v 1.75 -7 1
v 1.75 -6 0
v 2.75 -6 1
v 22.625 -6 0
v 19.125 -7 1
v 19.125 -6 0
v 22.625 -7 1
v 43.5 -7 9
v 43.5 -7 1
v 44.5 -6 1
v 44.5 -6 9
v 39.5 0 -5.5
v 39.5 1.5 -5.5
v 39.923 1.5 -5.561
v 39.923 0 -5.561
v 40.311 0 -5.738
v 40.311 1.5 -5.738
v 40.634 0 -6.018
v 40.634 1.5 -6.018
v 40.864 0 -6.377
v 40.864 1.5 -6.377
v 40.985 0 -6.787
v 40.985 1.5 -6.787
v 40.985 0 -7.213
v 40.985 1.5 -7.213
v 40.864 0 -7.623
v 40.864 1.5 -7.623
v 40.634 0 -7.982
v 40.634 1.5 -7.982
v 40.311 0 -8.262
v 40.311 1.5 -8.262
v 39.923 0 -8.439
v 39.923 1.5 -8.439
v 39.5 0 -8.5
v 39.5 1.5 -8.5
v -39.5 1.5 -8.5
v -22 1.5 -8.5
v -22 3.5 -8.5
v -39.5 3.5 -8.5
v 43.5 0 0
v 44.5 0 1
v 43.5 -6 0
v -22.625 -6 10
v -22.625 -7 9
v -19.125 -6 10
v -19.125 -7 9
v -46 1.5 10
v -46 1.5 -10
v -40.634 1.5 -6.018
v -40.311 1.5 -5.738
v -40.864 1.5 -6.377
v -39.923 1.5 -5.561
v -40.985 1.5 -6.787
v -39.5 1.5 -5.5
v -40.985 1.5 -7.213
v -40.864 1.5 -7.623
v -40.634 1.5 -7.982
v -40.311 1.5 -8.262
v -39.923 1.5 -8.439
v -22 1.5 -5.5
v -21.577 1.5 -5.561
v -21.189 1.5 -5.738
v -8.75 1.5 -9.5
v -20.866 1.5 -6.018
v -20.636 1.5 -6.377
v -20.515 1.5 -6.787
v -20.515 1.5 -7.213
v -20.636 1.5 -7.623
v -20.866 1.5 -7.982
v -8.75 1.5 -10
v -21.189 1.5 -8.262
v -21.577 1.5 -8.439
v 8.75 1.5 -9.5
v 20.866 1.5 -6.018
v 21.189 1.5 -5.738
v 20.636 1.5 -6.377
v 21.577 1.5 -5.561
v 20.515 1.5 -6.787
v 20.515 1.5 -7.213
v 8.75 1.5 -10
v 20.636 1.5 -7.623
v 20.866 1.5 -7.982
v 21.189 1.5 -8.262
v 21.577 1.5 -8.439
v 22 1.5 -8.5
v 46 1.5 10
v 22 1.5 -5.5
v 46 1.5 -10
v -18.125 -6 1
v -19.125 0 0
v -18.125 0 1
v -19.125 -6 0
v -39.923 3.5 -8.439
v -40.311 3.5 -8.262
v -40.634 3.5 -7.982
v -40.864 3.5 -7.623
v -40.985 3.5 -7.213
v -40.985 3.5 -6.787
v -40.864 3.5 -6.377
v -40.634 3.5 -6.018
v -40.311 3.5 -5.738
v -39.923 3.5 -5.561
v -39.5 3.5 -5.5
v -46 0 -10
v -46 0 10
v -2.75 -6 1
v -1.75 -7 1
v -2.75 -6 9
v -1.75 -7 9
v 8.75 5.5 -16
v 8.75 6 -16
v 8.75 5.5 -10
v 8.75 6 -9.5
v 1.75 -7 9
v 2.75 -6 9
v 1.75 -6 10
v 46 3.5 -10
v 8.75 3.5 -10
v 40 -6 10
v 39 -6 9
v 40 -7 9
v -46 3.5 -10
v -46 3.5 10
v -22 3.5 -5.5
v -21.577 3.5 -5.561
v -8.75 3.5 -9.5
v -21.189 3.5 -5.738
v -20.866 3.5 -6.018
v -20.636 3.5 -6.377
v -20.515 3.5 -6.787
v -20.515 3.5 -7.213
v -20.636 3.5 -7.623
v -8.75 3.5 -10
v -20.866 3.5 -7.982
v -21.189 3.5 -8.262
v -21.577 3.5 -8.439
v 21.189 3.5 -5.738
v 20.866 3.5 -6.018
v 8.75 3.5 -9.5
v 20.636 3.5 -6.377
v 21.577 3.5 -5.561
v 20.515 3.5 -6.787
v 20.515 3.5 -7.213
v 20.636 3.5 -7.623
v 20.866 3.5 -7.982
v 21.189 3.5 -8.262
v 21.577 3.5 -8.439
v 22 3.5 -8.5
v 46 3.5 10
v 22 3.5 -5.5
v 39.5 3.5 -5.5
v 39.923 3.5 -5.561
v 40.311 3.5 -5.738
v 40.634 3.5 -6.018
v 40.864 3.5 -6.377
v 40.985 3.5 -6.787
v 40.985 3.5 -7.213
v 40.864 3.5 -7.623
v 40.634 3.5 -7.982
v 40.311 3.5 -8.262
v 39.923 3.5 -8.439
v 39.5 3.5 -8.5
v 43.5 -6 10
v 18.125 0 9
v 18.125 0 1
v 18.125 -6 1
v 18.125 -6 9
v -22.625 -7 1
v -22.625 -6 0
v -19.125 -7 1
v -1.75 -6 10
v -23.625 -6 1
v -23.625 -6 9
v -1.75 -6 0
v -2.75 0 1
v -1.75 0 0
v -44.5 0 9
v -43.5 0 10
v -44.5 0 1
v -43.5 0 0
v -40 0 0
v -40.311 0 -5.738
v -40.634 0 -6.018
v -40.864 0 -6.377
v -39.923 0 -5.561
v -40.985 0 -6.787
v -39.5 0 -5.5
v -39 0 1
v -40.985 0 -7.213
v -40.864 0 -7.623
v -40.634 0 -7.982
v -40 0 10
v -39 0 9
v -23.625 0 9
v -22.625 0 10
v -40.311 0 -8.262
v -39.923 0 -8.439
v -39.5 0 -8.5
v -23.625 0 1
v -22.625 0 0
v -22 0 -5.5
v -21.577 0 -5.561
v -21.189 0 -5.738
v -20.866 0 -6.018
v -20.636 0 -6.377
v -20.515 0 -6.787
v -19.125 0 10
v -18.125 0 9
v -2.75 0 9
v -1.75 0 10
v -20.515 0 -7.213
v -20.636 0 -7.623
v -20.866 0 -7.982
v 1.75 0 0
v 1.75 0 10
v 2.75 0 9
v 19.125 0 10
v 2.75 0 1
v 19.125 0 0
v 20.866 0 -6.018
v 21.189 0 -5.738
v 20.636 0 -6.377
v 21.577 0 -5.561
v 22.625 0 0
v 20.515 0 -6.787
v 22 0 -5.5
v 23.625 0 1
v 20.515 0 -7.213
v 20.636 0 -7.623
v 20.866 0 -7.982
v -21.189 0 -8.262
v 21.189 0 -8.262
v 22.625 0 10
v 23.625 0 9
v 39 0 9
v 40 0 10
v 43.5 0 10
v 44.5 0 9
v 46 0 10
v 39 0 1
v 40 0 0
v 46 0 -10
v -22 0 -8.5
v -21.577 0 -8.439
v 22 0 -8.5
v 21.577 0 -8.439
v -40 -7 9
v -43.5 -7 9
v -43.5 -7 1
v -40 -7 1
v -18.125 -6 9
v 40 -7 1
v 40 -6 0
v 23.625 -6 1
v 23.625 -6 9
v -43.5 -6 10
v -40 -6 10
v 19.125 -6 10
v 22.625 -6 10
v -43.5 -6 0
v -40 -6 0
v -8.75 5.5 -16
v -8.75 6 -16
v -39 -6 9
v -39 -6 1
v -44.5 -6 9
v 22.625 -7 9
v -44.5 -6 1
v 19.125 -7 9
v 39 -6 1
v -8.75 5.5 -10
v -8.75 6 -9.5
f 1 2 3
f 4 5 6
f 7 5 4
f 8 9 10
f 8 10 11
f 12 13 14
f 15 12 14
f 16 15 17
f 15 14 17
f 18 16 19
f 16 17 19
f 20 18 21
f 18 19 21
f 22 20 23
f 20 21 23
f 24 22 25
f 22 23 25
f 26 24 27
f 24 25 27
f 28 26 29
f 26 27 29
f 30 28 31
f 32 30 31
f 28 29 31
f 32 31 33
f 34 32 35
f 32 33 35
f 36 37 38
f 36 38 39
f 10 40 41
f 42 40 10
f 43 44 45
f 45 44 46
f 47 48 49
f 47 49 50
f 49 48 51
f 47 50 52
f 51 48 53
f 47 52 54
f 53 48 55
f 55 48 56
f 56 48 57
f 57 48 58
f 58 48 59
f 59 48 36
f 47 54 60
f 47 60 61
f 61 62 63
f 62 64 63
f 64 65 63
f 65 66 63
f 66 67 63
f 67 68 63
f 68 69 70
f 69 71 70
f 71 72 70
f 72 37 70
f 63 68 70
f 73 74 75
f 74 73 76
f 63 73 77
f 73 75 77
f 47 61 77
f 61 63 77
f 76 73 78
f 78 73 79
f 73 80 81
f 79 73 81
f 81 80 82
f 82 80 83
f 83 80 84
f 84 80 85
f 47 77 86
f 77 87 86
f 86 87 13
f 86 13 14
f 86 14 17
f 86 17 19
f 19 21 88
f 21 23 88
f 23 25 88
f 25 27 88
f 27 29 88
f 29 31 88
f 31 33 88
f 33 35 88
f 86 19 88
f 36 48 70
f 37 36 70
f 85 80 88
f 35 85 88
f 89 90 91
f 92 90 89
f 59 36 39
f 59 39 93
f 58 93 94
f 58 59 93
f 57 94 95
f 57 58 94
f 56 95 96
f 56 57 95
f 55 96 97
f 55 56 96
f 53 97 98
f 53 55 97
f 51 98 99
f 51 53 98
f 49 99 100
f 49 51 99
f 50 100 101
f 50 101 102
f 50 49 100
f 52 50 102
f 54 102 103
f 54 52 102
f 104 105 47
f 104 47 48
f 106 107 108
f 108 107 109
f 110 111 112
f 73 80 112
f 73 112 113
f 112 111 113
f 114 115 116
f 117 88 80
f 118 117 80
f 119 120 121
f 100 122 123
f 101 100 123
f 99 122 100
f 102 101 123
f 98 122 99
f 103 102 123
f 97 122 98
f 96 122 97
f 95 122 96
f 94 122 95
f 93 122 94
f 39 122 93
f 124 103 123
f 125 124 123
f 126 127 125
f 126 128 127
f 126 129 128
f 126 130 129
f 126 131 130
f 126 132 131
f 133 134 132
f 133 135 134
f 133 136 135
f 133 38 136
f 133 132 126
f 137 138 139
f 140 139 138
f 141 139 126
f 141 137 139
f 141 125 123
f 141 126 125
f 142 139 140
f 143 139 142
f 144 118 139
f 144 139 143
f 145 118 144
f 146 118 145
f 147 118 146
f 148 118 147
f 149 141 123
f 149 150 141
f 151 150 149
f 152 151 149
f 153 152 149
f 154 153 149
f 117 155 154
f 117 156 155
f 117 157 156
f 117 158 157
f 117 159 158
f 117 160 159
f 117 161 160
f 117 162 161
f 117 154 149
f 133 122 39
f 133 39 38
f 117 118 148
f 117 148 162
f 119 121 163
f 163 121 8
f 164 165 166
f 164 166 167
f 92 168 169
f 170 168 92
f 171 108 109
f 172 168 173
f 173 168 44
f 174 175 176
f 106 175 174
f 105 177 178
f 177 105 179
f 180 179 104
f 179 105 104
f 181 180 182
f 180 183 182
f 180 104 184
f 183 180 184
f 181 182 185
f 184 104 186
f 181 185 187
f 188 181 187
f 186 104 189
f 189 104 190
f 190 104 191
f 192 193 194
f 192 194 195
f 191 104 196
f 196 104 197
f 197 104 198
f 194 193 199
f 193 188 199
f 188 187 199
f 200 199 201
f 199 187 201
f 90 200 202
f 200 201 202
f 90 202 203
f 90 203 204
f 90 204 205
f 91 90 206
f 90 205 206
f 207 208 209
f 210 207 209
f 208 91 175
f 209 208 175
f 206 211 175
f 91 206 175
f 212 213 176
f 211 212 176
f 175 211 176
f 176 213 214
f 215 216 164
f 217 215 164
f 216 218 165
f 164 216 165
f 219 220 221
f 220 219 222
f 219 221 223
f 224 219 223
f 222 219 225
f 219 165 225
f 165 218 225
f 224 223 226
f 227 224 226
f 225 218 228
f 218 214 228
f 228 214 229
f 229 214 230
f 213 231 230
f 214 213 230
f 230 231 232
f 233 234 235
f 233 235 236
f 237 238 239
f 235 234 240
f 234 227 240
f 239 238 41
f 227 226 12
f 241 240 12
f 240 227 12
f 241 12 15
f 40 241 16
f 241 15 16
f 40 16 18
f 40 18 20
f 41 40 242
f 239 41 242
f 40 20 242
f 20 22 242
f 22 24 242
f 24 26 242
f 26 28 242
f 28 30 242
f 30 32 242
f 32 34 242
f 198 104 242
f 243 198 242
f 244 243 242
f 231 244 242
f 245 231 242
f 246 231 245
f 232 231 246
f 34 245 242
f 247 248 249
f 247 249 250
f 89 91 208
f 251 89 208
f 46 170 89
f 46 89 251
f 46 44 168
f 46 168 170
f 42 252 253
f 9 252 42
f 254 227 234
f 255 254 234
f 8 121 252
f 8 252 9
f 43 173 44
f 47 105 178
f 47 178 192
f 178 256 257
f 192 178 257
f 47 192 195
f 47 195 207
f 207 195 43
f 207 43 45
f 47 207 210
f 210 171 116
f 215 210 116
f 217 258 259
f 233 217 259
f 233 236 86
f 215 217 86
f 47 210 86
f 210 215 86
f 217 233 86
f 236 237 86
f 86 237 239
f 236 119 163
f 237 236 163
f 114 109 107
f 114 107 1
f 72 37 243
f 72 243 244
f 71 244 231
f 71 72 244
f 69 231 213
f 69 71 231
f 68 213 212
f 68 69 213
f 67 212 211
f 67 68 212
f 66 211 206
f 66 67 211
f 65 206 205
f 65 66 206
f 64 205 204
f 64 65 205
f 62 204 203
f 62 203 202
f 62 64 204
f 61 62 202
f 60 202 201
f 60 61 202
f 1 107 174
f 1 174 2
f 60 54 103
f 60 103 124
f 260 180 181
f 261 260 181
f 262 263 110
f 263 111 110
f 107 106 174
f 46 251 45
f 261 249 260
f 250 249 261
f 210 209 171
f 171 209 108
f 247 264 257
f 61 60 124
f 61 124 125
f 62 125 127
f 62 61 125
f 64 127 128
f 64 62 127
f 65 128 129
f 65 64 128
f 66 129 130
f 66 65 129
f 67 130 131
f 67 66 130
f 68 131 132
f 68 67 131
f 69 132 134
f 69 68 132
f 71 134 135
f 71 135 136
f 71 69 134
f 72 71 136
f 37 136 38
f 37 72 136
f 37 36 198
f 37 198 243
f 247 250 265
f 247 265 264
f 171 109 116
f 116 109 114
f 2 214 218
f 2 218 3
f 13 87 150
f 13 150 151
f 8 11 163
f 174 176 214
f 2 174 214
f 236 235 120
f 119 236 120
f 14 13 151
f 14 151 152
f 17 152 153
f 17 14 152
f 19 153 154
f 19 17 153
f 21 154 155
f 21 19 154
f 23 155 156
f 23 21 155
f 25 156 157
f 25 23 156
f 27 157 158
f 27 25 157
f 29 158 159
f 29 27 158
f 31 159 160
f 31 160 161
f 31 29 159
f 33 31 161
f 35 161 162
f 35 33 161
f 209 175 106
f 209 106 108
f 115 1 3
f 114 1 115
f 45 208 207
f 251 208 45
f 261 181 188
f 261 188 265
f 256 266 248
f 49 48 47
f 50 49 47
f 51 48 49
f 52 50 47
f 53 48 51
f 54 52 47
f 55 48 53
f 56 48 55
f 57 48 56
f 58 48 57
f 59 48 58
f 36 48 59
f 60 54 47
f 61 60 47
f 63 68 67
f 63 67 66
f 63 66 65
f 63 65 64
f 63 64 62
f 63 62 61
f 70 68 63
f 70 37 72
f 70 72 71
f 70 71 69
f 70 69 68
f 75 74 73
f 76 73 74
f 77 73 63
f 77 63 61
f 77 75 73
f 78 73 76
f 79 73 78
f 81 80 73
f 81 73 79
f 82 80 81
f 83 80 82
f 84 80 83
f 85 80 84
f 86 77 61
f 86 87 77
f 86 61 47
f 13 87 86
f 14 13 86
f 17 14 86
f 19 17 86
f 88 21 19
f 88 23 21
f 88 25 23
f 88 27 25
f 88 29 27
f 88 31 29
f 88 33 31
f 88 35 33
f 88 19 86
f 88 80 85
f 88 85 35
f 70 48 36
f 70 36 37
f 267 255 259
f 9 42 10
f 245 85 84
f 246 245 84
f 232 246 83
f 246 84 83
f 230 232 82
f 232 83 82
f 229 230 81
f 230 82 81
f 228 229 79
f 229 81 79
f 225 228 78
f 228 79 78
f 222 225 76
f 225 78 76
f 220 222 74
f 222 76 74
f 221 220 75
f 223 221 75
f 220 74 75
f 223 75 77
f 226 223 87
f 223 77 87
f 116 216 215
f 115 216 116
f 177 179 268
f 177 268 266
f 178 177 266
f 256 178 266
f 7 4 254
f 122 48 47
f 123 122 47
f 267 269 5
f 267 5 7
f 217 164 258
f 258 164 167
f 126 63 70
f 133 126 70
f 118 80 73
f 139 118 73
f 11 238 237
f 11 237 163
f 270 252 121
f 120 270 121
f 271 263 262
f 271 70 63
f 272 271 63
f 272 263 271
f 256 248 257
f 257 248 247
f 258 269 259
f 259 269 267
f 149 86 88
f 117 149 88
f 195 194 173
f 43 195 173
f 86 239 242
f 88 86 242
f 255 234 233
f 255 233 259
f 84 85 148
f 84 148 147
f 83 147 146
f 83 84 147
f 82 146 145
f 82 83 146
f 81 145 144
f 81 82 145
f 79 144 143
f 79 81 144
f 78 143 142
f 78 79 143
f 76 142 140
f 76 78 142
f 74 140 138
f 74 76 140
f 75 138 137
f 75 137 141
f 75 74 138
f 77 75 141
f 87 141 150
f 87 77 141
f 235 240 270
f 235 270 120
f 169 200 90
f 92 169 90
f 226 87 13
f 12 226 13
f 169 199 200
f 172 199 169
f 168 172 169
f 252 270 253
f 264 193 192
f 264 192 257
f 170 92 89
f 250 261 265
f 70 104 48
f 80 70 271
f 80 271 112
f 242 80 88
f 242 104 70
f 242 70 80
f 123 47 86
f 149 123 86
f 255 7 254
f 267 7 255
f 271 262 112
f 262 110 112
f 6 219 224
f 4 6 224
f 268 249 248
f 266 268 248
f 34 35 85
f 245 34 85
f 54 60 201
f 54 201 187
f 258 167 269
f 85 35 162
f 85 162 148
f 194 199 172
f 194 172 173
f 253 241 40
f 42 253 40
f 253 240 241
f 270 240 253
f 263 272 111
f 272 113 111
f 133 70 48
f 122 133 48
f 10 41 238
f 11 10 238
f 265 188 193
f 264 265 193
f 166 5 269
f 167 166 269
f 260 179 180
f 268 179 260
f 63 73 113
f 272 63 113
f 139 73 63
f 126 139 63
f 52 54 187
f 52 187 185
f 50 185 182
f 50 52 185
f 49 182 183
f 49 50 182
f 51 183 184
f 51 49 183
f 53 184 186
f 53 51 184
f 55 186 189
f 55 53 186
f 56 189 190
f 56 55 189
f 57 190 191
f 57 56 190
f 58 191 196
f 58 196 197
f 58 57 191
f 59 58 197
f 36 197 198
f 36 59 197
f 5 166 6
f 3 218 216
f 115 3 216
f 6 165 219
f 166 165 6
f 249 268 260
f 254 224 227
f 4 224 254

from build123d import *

# Parameters (mm, degrees)
SKETCH_1_W                         = 92
SKETCH_1_H                         = 20
EXTRUDE_1_DEPTH                    = 1.5
SKETCH_2_W                         = 5.5
SKETCH_2_H                         = 10
EXTRUDE_2_DEPTH                    = 7
CHAMFER_1_SIZE                     = 1
PATTERN_LINEAR_2_COUNT             = 5
PATTERN_LINEAR_2_PITCH             = 20.875
CHAMFER_1_OF_PATTERN_LINEAR_2_SIZE = 1
EXTRUDE_3_DEPTH                    = 8.75
CUT_EXTRUDE_1_DEPTH                = 1.5
EXTRUDE_4_DEPTH                    = 2


with BuildPart() as part:
    # 草图1 → 凸台-拉伸1 (new body)
    with BuildSketch(Plane(origin=(0, 0, 0), x_dir=(1, 0, 0), z_dir=(0, 1, 0))):
        Rectangle(SKETCH_1_W, SKETCH_1_H)
    extrude(amount=EXTRUDE_1_DEPTH)

    # 草图2 → 凸台-拉伸2 (add)
    with BuildSketch(Plane.XZ):
        with Locations((-41.75, 5)):
            Rectangle(SKETCH_2_W, SKETCH_2_H)
    extrude_2 = extrude(amount=EXTRUDE_2_DEPTH)

    # 倒角1
    chamfer_1_edges = [part.edges().sort_by_distance(p)[0] for p in [
        (-44.5, -3.5, 10),
        (-44.5, -3.5, 0),
        (-39, -3.5, 0),
        (-39, -3.5, 10),
        (-44.5, -7, 5),
        (-41.75, -7, 0),
        (-39, -7, 5),
        (-41.75, -7, 10),
    ]]
    chamfer(chamfer_1_edges, length=CHAMFER_1_SIZE)

    # 阵列(线性)2: 凸台-拉伸2 ×5
    with Locations(*[(i * PATTERN_LINEAR_2_PITCH, 0, 0) for i in range(1, PATTERN_LINEAR_2_COUNT)]):
        add(extrude_2)

    # 倒角1 of 阵列(线性)2
    chamfer_1_of_pattern_linear_2_edges = [part.edges().sort_by_distance(p)[0] for p in [
        (-23.625, -3.5, 10),
        (-23.625, -3.5, 0),
        (-18.125, -3.5, 0),
        (-18.125, -3.5, 10),
        (-23.625, -7, 5),
        (-20.875, -7, 0),
        (-18.125, -7, 5),
        (-20.875, -7, 10),
        (-2.75, -3.5, 10),
        (-2.75, -3.5, 0),
        (2.75, -3.5, 0),
        (2.75, -3.5, 10),
        (-2.75, -7, 5),
        (0, -7, 0),
        (2.75, -7, 5),
        (0, -7, 10),
        (18.125, -3.5, 10),
        (18.125, -3.5, 0),
        (23.625, -3.5, 0),
        (23.625, -3.5, 10),
        (18.125, -7, 5),
        (20.875, -7, 0),
        (23.625, -7, 5),
        (20.875, -7, 10),
        (39, -3.5, 10),
        (39, -3.5, 0),
        (44.5, -3.5, 0),
        (44.5, -3.5, 10),
        (39, -7, 5),
        (41.75, -7, 0),
        (44.5, -7, 5),
        (41.75, -7, 10),
    ]]
    chamfer(chamfer_1_of_pattern_linear_2_edges, length=CHAMFER_1_OF_PATTERN_LINEAR_2_SIZE)

    # 草图4 → 凸台-拉伸3 (add, symmetric)
    with BuildSketch(Plane(origin=(0, 0, 0), x_dir=(0, 0, -1), z_dir=(1, 0, 0))):
        Polygon((9.5, 1.5), (9.5, 6), (16, 6), (16, 5.5), (10, 5.5), (10, 1.5), align=None)
    extrude(amount=EXTRUDE_3_DEPTH, both=True)

    # 草图5 → 切除-拉伸1 (cut)
    with BuildSketch(Plane(origin=(0, 1.5, 0), x_dir=(1, 0, 0), z_dir=(0, 1, 0))):
        with BuildLine():
            Line((-39.5, 8.5), (-22, 8.5))
            ThreePointArc((-22, 8.5), (-20.5, 7), (-22, 5.5))
            Line((-22, 5.5), (-39.5, 5.5))
            ThreePointArc((-39.5, 5.5), (-41, 7), (-39.5, 8.5))
        make_face()
        with BuildLine():
            Line((39.5, 8.5), (22, 8.5))
            ThreePointArc((22, 8.5), (20.5, 7), (22, 5.5))
            Line((22, 5.5), (39.5, 5.5))
            ThreePointArc((39.5, 5.5), (41, 7), (39.5, 8.5))
        make_face()
    extrude(amount=-CUT_EXTRUDE_1_DEPTH, mode=Mode.SUBTRACT)


with BuildPart() as body_2:
    # 草图6 → 凸台-拉伸4 (new body)
    with BuildSketch(Plane(origin=(0, 1.5, 0), x_dir=(1, 0, 0), z_dir=(0, 1, 0))):
        Polygon((8.75, 9.5), (-8.75, 9.5), (-8.75, 10), (-46, 10), (-46, -10), (46, -10), (46, 10), (8.75, 10), align=None)
        with BuildLine():
            Line((39.5, 8.5), (22, 8.5))
            ThreePointArc((22, 8.5), (20.5, 7), (22, 5.5))
            Line((22, 5.5), (39.5, 5.5))
            ThreePointArc((39.5, 5.5), (41, 7), (39.5, 8.5))
        make_face(mode=Mode.SUBTRACT)
        with BuildLine():
            Line((-39.5, 5.5), (-22, 5.5))
            ThreePointArc((-22, 5.5), (-20.5, 7), (-22, 8.5))
            Line((-22, 8.5), (-39.5, 8.5))
            ThreePointArc((-39.5, 8.5), (-41, 7), (-39.5, 5.5))
        make_face(mode=Mode.SUBTRACT)
    extrude(amount=EXTRUDE_4_DEPTH)


solid = Compound([part.part, body_2.part])
